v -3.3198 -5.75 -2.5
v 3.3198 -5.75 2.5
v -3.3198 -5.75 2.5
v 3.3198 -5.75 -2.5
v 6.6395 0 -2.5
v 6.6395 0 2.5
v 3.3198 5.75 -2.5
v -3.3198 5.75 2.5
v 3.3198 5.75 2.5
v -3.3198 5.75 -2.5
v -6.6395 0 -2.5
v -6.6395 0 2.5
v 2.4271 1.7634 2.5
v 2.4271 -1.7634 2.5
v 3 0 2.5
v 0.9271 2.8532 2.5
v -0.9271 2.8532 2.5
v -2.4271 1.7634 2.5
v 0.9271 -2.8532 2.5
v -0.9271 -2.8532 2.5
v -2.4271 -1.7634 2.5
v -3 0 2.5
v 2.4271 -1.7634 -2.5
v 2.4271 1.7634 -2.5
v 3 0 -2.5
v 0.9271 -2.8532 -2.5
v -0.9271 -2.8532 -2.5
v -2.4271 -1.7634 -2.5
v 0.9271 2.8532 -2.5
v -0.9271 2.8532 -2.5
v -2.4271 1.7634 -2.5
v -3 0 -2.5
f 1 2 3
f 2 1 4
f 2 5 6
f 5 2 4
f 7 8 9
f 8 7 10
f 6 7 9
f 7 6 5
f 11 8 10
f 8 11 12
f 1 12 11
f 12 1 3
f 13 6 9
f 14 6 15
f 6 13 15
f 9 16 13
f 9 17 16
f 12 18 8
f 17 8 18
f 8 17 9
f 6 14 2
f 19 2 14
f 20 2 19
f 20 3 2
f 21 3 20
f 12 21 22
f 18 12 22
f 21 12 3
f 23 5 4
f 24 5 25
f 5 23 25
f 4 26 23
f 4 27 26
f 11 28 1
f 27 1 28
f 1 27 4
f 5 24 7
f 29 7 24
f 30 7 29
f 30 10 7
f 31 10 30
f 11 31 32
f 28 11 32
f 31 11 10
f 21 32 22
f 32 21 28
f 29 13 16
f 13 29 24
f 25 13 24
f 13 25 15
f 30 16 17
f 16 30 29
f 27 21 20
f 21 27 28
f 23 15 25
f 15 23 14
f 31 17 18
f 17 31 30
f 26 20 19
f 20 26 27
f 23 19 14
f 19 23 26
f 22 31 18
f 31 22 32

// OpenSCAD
// Parameters
thread_diameter = 6; //[3:12:0.1]
across_flats = 11.5; //[6:23:0.1]
thickness = 5; //[2.5:10:0.1]
hole_clearance = 0; //[0:1:0.05]
overlap = 1; //[0.5:2:0.1]
washer_enabled = 0; //[0:1:1]
washer_outer_diameter = 18; //[9:36:0.1]
washer_thickness = 1.6; //[0.8:3.2:0.1]

// Hexagonal Nut
module hex_nut() {
  color("DimGray") {
    difference() {
      // Hex nut body
      cylinder(h=thickness, r=across_flats/(2*cos(30)), center=true, $fn=6);
      // Central through-hole
      translate([0, 0, 0])
        cylinder(h=thickness + 2*overlap, r=(thread_diameter + hole_clearance)/2, center=true);
    }
  }
}

// Washer
module washer() {
  if (washer_enabled) {
    color("Silver") {
      difference() {
        // Washer outer
        translate([0, 0, -(thickness/2 + washer_thickness/2 - overlap)])
          cylinder(h=washer_thickness, r=washer_outer_diameter/2, center=true);
        // Washer hole
        translate([0, 0, -(thickness/2 + washer_thickness/2 - overlap)])
          cylinder(h=washer_thickness + 2*overlap, r=(thread_diameter + hole_clearance)/2, center=true);
      }
    }
  }
}

// Nut and Washer Assembly
module nut_and_washer() {
  union() {
    hex_nut();
    washer();
  }
}

// Final Assembly
module assembly() {
  nut_and_washer();
}

assembly();
